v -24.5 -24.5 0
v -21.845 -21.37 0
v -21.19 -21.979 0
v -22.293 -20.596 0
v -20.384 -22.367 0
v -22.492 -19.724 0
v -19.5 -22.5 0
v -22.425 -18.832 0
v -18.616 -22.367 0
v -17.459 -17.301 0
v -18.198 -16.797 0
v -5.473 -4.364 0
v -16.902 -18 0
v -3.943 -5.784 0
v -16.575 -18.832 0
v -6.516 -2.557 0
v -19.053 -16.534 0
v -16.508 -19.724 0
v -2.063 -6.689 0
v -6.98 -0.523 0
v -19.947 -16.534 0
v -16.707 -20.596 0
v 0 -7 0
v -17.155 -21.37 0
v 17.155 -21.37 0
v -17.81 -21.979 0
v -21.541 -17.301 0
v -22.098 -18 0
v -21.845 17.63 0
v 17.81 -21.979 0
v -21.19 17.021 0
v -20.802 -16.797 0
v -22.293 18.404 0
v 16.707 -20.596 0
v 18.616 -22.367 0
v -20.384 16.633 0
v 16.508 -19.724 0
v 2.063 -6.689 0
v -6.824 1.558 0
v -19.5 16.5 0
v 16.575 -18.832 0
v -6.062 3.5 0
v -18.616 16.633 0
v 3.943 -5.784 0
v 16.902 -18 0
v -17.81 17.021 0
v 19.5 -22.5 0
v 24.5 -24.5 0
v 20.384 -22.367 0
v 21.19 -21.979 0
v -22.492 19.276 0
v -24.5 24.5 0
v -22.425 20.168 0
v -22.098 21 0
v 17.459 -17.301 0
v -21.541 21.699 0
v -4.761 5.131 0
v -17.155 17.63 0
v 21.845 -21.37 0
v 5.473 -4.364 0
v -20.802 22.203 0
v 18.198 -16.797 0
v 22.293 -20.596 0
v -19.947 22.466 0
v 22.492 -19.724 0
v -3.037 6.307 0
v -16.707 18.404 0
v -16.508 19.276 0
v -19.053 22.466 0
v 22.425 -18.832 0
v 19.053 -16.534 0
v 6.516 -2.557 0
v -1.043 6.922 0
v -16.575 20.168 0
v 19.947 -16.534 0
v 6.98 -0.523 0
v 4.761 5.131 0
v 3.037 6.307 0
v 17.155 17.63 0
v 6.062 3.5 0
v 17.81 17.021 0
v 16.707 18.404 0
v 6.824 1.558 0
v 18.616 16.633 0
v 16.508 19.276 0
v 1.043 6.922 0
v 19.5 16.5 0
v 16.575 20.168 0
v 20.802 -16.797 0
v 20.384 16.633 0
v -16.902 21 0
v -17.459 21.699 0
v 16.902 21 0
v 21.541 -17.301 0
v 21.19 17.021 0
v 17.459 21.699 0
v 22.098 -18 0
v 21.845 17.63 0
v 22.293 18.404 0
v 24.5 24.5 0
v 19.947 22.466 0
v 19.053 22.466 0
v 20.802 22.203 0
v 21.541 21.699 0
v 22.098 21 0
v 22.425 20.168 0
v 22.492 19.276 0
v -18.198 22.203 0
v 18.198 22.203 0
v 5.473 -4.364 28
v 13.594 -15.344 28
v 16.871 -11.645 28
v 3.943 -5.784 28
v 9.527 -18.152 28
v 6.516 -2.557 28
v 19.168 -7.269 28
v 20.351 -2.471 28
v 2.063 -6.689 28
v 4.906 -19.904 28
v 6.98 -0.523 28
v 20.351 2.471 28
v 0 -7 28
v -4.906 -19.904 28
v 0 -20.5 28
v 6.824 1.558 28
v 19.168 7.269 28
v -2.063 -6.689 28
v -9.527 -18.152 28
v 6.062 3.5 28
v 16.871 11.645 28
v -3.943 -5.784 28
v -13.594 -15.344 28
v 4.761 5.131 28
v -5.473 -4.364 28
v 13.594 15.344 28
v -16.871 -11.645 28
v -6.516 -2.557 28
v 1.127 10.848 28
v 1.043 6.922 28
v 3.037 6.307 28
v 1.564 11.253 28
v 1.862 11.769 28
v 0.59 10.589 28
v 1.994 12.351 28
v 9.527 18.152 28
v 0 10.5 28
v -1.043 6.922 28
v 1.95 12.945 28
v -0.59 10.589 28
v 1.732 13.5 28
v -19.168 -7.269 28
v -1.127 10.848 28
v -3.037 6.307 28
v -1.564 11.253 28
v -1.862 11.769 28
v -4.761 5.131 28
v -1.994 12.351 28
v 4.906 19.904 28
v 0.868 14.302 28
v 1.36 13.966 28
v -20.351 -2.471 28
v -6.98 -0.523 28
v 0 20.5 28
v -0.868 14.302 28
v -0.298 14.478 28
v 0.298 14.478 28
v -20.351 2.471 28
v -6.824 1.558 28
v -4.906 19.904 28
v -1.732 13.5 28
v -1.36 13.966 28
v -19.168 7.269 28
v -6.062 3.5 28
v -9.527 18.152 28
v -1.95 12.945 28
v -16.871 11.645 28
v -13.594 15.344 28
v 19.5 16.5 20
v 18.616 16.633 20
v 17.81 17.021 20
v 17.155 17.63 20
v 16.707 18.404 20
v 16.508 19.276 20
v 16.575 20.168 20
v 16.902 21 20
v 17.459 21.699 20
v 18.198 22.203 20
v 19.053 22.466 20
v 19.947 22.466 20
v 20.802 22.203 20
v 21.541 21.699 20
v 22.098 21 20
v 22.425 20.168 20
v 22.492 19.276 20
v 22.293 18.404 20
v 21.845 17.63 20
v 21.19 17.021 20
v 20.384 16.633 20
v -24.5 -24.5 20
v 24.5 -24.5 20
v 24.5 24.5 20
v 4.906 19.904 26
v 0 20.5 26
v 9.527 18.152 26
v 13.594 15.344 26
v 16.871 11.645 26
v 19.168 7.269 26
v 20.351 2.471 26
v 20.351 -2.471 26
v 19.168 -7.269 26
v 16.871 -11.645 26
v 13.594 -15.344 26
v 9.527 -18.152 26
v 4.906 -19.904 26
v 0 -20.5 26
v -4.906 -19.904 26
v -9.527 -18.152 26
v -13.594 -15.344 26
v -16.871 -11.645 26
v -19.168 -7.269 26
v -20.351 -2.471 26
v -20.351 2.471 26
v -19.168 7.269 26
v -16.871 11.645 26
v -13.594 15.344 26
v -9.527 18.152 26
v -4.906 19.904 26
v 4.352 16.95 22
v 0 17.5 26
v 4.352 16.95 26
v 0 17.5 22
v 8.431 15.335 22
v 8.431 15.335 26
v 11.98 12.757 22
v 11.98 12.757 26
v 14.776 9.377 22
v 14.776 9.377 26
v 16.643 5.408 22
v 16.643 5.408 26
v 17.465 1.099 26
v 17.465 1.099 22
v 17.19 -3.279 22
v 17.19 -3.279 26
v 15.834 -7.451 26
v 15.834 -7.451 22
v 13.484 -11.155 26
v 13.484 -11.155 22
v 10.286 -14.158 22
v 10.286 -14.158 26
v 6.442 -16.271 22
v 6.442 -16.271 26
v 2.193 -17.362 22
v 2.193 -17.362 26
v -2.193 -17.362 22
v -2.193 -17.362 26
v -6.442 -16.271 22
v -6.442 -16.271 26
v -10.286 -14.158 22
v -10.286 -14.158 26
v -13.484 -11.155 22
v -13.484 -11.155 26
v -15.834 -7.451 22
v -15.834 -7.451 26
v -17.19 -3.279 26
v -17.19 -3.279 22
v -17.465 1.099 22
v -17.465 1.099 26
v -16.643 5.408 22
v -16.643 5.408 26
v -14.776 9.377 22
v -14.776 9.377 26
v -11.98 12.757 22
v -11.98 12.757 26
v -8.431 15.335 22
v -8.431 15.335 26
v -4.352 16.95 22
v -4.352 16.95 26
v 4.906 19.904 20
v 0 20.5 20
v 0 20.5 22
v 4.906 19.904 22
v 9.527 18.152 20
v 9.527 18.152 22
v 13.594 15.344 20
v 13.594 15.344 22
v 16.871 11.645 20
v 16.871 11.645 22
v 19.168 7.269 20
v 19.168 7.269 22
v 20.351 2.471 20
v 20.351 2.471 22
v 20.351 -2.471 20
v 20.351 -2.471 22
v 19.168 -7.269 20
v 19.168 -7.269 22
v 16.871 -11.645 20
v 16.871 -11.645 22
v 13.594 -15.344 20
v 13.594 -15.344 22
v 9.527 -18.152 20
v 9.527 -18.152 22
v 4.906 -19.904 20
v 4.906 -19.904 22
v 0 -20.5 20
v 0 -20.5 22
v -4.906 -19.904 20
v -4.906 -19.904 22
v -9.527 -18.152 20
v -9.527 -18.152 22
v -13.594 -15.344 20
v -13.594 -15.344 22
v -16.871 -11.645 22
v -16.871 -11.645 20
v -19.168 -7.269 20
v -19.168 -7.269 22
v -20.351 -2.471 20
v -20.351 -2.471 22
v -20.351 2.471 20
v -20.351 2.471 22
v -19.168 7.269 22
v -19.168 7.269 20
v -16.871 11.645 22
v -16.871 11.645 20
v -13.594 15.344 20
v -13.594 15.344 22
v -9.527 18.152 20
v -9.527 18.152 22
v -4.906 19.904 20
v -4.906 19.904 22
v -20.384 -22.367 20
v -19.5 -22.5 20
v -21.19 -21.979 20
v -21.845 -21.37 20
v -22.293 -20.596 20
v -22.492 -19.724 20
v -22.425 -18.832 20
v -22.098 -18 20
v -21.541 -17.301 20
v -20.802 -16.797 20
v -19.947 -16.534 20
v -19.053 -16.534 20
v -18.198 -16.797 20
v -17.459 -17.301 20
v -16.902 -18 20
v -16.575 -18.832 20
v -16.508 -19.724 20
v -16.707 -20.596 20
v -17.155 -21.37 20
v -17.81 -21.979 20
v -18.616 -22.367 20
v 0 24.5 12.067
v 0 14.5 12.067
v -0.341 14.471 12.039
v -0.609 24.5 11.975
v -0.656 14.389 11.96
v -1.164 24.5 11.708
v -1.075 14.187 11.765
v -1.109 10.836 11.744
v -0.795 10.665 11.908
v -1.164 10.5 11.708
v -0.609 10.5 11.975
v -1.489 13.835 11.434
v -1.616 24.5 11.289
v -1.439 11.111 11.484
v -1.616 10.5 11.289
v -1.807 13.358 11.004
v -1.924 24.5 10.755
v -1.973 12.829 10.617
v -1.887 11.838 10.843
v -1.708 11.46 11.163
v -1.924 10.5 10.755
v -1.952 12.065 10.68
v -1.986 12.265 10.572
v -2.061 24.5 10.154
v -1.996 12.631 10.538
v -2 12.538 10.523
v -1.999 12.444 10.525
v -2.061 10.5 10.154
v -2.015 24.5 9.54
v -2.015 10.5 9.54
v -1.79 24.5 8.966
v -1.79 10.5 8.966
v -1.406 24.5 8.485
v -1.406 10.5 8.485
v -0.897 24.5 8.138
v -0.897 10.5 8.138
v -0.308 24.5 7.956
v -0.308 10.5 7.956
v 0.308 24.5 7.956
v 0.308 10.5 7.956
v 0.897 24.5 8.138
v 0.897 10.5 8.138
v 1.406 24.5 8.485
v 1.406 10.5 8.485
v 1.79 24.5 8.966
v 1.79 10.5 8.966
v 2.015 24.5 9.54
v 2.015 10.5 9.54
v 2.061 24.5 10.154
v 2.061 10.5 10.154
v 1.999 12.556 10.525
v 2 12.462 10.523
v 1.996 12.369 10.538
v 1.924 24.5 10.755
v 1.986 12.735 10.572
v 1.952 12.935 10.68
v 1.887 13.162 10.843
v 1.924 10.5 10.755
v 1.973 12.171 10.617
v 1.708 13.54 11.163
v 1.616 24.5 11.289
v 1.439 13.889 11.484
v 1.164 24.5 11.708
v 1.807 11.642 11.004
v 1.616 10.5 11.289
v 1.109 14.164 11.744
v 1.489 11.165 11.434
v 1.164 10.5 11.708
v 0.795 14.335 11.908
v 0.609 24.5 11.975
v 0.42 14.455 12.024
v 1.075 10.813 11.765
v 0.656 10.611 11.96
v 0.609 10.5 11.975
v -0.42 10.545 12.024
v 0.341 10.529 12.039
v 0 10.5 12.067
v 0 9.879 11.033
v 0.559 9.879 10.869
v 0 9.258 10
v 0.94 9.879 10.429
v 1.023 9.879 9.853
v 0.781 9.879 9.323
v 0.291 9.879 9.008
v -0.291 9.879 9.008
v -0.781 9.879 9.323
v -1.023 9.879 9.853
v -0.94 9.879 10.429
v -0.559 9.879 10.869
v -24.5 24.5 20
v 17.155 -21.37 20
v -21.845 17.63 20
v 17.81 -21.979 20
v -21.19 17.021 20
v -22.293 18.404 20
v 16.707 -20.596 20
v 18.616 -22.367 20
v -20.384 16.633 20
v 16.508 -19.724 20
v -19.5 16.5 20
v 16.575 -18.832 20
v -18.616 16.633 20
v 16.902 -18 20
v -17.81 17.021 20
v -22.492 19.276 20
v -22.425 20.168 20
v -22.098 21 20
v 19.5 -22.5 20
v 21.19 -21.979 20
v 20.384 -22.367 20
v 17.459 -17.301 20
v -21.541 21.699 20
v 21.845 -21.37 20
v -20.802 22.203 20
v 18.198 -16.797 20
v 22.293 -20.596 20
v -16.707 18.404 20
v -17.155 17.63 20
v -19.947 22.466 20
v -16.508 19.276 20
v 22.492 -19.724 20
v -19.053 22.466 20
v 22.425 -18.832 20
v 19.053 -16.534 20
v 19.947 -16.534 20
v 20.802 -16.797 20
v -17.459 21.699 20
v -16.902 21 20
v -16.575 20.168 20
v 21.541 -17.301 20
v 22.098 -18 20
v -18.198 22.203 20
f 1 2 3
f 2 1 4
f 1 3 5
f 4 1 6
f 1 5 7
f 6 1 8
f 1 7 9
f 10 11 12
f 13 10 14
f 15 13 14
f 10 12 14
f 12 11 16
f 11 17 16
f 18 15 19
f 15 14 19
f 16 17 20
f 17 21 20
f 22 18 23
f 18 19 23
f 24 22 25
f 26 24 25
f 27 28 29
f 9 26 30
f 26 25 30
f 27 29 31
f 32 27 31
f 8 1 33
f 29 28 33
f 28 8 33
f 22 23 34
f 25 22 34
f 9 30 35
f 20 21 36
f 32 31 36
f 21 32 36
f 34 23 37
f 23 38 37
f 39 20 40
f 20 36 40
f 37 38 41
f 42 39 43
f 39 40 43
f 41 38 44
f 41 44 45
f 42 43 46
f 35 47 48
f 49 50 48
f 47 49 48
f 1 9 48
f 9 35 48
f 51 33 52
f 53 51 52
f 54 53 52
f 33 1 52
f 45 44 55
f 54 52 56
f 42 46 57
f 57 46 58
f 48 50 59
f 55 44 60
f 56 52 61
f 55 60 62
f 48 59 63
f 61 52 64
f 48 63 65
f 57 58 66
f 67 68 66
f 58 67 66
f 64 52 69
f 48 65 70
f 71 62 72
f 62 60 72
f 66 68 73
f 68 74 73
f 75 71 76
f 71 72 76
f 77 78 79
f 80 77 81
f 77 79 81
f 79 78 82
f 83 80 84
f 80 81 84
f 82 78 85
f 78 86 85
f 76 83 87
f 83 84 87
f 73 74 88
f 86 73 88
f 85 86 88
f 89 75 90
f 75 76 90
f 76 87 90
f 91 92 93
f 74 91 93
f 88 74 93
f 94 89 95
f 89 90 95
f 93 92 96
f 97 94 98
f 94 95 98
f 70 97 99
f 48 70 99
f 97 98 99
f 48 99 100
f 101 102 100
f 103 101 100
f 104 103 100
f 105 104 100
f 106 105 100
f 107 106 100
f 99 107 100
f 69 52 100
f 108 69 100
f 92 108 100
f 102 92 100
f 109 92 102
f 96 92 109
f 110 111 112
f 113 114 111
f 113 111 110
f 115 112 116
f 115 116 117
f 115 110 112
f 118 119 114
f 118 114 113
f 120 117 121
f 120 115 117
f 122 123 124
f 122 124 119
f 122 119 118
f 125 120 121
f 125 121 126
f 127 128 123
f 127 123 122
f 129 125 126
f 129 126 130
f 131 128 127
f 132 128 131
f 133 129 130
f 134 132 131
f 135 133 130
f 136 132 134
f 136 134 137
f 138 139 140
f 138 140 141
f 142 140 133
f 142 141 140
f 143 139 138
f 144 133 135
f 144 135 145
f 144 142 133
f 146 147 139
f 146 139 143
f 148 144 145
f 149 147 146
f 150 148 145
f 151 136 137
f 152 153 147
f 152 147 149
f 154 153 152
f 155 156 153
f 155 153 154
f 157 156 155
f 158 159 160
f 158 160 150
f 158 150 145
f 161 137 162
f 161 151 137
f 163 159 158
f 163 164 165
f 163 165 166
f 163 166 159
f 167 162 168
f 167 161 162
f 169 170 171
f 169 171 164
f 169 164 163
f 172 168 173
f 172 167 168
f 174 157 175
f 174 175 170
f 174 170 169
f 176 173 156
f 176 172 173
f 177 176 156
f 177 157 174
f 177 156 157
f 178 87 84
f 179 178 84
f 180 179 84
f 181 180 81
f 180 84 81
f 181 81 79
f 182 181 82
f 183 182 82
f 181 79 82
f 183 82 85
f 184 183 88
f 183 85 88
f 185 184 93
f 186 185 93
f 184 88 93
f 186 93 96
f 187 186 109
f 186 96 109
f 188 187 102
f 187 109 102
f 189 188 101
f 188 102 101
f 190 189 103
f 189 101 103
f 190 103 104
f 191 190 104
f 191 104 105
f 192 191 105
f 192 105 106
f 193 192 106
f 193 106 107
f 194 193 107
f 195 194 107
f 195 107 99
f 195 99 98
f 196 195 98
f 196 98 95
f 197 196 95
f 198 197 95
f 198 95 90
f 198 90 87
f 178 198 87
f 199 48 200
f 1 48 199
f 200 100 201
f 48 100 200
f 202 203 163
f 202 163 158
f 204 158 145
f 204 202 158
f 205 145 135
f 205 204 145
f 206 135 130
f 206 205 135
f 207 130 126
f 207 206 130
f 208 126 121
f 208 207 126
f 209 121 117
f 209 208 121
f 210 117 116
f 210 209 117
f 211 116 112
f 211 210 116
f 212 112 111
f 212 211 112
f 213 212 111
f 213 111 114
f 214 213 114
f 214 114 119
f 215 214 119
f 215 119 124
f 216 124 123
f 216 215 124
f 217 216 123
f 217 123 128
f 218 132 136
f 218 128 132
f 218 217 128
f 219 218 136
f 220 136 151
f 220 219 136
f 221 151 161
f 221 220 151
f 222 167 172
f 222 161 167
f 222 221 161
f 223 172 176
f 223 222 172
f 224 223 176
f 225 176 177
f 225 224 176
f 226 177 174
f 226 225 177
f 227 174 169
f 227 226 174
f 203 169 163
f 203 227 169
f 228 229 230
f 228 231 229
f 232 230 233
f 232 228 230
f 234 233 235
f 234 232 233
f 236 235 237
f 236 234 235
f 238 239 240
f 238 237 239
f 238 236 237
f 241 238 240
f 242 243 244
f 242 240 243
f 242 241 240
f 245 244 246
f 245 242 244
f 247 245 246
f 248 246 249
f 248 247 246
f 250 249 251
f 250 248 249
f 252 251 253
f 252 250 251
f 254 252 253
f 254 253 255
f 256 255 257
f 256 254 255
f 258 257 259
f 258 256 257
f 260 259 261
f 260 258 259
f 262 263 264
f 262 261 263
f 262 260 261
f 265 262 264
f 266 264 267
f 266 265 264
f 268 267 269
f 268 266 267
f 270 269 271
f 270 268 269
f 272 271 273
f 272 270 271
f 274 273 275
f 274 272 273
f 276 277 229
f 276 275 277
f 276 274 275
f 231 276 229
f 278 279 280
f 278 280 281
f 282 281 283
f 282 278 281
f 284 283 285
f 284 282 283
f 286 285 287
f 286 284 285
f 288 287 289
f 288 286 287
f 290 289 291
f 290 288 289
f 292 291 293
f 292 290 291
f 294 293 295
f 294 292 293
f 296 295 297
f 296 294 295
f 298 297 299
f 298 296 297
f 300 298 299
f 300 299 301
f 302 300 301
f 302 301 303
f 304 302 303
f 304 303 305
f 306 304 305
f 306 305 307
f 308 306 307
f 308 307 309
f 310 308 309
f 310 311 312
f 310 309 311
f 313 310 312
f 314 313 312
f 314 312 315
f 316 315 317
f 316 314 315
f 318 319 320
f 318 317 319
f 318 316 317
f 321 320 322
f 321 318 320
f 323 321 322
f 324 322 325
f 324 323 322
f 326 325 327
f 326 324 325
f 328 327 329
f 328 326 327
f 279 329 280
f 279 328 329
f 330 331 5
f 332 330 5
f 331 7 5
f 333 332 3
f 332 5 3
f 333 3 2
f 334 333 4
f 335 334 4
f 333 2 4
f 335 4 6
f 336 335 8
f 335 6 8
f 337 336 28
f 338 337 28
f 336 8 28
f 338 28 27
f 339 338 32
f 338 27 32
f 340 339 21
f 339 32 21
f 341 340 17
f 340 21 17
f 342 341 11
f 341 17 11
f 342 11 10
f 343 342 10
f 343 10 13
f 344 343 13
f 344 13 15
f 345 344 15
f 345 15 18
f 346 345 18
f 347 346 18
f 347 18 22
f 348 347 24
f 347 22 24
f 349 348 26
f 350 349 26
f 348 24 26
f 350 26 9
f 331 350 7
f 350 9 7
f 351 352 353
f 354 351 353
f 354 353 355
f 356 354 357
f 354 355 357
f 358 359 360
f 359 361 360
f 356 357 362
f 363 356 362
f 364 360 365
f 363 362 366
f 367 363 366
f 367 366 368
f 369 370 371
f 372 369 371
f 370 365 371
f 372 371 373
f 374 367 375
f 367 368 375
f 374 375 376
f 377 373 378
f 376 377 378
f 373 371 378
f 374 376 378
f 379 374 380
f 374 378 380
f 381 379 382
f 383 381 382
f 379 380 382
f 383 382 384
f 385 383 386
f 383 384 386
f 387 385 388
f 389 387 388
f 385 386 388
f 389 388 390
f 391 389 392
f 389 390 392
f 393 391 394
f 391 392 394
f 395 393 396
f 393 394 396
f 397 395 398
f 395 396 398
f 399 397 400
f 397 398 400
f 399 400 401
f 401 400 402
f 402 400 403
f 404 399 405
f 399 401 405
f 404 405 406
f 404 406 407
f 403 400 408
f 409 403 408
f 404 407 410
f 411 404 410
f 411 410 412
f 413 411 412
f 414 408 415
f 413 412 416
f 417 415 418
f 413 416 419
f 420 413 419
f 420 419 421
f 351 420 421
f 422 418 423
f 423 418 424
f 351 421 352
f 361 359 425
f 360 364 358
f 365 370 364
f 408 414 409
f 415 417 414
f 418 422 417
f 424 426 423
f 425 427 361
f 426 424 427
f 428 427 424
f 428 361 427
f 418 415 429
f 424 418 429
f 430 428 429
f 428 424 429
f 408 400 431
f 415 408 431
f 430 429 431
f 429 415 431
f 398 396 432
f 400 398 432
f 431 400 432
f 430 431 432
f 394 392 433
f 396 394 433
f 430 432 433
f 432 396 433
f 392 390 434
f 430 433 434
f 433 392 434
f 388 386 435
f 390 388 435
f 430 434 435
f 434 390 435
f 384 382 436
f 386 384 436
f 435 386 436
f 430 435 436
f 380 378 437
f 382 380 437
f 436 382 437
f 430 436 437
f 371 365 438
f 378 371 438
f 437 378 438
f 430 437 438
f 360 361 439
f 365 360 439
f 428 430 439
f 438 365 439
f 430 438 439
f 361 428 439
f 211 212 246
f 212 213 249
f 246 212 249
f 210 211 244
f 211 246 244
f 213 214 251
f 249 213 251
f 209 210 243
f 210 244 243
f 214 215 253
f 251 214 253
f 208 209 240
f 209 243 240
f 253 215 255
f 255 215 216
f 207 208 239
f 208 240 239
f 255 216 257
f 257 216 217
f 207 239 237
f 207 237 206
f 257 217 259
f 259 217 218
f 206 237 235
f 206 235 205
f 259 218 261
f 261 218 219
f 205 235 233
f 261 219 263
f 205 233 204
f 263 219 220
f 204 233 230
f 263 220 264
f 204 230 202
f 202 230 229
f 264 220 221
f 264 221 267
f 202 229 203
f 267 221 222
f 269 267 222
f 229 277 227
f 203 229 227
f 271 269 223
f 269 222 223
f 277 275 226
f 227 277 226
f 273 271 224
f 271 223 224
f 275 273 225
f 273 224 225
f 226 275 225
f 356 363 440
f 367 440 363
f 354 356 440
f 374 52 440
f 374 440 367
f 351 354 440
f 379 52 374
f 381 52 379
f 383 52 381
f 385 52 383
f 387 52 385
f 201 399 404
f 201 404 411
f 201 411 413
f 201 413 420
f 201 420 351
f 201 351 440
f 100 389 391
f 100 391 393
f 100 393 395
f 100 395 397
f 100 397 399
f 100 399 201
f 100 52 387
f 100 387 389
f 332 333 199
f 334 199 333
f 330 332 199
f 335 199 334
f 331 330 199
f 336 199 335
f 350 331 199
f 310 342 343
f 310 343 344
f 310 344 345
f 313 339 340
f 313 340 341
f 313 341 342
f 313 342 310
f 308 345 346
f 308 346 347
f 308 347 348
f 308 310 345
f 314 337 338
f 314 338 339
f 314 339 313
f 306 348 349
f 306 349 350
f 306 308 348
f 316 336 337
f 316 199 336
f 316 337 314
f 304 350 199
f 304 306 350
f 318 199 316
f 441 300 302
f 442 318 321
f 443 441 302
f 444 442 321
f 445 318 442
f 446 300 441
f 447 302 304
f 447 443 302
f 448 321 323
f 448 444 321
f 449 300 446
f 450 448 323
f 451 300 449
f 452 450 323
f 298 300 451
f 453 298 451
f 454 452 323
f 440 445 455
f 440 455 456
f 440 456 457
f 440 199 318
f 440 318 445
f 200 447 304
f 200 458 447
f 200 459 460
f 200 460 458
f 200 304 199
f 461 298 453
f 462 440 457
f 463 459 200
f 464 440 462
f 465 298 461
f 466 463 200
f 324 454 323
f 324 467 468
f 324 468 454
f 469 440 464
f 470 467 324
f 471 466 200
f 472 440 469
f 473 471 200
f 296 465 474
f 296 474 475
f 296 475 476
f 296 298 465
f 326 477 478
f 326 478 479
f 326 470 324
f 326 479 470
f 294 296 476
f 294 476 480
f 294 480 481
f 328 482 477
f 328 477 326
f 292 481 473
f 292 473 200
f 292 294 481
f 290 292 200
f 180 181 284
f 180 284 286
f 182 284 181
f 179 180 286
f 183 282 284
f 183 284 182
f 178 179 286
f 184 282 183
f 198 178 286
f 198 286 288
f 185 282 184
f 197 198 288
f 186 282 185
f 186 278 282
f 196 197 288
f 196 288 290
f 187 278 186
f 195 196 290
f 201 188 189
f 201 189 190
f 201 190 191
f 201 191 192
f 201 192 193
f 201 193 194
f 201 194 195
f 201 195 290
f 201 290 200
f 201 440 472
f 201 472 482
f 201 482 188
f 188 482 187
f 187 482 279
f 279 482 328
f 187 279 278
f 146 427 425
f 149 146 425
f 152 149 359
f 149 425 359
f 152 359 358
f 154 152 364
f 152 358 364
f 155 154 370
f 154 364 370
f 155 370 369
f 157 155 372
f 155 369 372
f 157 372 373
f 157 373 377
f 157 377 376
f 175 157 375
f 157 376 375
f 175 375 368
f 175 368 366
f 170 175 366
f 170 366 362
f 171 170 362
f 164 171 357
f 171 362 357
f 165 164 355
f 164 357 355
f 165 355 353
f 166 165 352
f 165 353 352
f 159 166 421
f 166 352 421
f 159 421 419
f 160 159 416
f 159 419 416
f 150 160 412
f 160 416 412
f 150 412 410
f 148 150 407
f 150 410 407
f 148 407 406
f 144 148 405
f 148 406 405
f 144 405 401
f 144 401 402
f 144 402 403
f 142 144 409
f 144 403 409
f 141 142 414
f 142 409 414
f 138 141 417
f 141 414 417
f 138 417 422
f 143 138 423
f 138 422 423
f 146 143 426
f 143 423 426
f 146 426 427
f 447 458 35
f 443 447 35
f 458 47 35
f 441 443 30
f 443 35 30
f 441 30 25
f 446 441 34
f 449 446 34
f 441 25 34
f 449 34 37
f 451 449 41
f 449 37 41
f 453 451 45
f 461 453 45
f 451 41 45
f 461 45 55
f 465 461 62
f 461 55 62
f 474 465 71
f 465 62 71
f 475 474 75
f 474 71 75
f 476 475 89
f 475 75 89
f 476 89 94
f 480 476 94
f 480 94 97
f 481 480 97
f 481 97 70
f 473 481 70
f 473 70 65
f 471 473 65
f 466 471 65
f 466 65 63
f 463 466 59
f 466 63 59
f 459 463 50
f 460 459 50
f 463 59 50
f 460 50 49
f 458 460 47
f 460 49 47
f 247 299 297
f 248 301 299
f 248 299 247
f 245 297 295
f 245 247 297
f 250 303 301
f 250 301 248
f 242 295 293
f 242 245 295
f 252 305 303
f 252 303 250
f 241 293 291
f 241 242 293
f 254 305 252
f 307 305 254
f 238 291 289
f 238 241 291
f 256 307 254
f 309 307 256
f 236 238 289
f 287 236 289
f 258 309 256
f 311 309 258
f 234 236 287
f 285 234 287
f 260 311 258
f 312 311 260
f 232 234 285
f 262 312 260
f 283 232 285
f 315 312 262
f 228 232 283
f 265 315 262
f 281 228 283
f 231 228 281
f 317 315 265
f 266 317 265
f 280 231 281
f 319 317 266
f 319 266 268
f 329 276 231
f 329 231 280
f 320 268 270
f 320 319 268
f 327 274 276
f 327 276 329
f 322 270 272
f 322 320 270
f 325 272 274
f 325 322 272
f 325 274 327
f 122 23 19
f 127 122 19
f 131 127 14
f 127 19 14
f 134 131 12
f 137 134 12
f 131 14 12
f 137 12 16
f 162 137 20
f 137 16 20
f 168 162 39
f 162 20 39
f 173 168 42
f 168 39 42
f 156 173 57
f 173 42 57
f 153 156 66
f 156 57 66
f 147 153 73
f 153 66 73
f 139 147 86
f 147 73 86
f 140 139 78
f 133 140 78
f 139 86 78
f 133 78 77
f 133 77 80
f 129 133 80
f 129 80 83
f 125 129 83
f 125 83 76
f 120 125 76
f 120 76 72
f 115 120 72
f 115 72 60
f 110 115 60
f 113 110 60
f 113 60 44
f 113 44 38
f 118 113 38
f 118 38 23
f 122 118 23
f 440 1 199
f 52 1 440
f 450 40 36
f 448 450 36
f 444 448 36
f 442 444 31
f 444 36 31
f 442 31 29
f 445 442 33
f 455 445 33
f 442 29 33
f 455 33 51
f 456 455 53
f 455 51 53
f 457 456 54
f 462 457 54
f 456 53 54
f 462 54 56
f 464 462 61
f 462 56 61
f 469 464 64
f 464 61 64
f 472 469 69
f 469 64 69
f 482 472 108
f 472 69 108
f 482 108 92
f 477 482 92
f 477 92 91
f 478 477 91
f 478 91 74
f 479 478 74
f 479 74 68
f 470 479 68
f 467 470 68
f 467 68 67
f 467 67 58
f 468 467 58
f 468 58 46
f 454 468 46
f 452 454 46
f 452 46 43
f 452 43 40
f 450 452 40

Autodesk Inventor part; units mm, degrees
ref_plane "YZ Plane" through (0, 0, 0) normal (1, 0, 0) x (0, 1, 0)
ref_plane "XZ Plane" through (0, 0, 0) normal (0, 1, 0) x (-1, 0, 0)
ref_plane "XY Plane" through (0, 0, 0) normal (0, 0, 1) x (1, 0, 0)
sketch "Sketch1" plane through (0, 0, 0) normal (0, 0, 1) x (1, 0, 0)
  line L0 (-24.5, 24.5) -> (24.5, 24.5)
  line L1 (24.5, 24.5) -> (24.5, -24.5)
  line L2 (24.5, -24.5) -> (-24.5, -24.5)
  line L3 (-24.5, -24.5) -> (-24.5, 24.5)
  point P0 (0, 0)
  point P1 (-24.5, 0)
  point P2 (0, 24.5)
  dimension "Width" = 49
  dimension "Height" = 49
extrude "Extrusion1" add sketch "Sketch1" along normal blind 20
sketch "Sketch2" plane through (0, 0, 20) normal (0, 0, 1) x (1, 0, 0)
  line L0 (24.5, 24.5) -> (24.5, -24.5) projected
  line L1 (-24.5, 24.5) -> (24.5, 24.5) projected
  line L2 (-24.5, -24.5) -> (-24.5, 24.5) projected
  line L3 (24.5, -24.5) -> (-24.5, -24.5) projected
  line L4 (19.5, 19.5) -> (19.5, -19.5)
  line L5 (19.5, -19.5) -> (-19.5, -19.5)
  line L6 (-19.5, -19.5) -> (-19.5, 19.5)
  line L7 (-19.5, 19.5) -> (19.5, 19.5)
  point P0 (0, 0)
  dimension "d4" = 5
  dimension "d5" = 39
  dimension "d6" = 39
hole "Hole1" at (-19.5, -19.5, 20) direction (0, 0, -1) diameter 6 end through all
pattern_linear "Rectangular Pattern1" count 2 spacing 39 along (1, 0, 0) count 2 spacing 39 along (0, 1, 0) of "Hole1"
sketch "Sketch3" plane through (0, 0, 0) normal (1, 0, 0) x (0, 1, 0)
  line L0 (-24.5, 20) -> (24.5, 20) projected
  line L1 (0, 20) -> (0, 28)
  line L2 (0, 28) -> (20.5, 28)
  line L3 (20.5, 28) -> (20.5, 26)
  line L4 (20.5, 26) -> (17.5, 26)
  line L5 (17.5, 26) -> (17.5, 22)
  line L6 (17.5, 22) -> (20.5, 22)
  line L7 (20.5, 22) -> (20.5, 20)
  point P0 (0, 0)
  dimension "d25" = 8
  dimension "d26" = 20.5
  dimension "d27" = 2
  dimension "d28" = 4
  dimension "d29" = 17.5
revolve "Revolution1" add sketch "Sketch3" angle 360 about axis through (0, 0, 20) along (0, 0, 1)
sketch "Sketch4" plane through (-24.5, 24.5, 0) normal (0, 1, 0) x (1, 0, 0)
  line L0 (0, -20) -> (49, -20) projected
  line L1 (0, 0) -> (0, -20) projected
  line L2 (24.5, -20) -> (24.5, -10)
  point P0 (24.5, 0)
  dimension "d31" = 10
hole "Hole4" at (0, 24.5, 10) direction (0, -1, 0) diameter 4.134 depth 14 tip angle 118 thread size "M5x0.8" class "6H" standard "ANSI Metric M Profile"
ref_plane "Work Plane3" through (0, 24.5, 10) normal (0, 0, 1) x (0, -1, 0)
sketch "Sketch7" plane through (0, 0, 28) normal (0, 0, 1) x (1, 0, 0)
  circle A0 centre (0, 0) radius 20.5 projected
  line L0 (0, 0) -> (0, 12.5)
  dimension "d56" = 12.5
hole "Hole5" at (0, 12.5, 28) direction (0, 0, -1) diameter 4 depth 18
hole "Hole6" at (0, 0, 28) direction (0, 0, -1) diameter 14 end through all
equation "\"Height\" = Width"
equation "\"d16\" = d5"
equation "\"d19\" = d6"
properties part number "TU-002" material "Steel, Mild"
